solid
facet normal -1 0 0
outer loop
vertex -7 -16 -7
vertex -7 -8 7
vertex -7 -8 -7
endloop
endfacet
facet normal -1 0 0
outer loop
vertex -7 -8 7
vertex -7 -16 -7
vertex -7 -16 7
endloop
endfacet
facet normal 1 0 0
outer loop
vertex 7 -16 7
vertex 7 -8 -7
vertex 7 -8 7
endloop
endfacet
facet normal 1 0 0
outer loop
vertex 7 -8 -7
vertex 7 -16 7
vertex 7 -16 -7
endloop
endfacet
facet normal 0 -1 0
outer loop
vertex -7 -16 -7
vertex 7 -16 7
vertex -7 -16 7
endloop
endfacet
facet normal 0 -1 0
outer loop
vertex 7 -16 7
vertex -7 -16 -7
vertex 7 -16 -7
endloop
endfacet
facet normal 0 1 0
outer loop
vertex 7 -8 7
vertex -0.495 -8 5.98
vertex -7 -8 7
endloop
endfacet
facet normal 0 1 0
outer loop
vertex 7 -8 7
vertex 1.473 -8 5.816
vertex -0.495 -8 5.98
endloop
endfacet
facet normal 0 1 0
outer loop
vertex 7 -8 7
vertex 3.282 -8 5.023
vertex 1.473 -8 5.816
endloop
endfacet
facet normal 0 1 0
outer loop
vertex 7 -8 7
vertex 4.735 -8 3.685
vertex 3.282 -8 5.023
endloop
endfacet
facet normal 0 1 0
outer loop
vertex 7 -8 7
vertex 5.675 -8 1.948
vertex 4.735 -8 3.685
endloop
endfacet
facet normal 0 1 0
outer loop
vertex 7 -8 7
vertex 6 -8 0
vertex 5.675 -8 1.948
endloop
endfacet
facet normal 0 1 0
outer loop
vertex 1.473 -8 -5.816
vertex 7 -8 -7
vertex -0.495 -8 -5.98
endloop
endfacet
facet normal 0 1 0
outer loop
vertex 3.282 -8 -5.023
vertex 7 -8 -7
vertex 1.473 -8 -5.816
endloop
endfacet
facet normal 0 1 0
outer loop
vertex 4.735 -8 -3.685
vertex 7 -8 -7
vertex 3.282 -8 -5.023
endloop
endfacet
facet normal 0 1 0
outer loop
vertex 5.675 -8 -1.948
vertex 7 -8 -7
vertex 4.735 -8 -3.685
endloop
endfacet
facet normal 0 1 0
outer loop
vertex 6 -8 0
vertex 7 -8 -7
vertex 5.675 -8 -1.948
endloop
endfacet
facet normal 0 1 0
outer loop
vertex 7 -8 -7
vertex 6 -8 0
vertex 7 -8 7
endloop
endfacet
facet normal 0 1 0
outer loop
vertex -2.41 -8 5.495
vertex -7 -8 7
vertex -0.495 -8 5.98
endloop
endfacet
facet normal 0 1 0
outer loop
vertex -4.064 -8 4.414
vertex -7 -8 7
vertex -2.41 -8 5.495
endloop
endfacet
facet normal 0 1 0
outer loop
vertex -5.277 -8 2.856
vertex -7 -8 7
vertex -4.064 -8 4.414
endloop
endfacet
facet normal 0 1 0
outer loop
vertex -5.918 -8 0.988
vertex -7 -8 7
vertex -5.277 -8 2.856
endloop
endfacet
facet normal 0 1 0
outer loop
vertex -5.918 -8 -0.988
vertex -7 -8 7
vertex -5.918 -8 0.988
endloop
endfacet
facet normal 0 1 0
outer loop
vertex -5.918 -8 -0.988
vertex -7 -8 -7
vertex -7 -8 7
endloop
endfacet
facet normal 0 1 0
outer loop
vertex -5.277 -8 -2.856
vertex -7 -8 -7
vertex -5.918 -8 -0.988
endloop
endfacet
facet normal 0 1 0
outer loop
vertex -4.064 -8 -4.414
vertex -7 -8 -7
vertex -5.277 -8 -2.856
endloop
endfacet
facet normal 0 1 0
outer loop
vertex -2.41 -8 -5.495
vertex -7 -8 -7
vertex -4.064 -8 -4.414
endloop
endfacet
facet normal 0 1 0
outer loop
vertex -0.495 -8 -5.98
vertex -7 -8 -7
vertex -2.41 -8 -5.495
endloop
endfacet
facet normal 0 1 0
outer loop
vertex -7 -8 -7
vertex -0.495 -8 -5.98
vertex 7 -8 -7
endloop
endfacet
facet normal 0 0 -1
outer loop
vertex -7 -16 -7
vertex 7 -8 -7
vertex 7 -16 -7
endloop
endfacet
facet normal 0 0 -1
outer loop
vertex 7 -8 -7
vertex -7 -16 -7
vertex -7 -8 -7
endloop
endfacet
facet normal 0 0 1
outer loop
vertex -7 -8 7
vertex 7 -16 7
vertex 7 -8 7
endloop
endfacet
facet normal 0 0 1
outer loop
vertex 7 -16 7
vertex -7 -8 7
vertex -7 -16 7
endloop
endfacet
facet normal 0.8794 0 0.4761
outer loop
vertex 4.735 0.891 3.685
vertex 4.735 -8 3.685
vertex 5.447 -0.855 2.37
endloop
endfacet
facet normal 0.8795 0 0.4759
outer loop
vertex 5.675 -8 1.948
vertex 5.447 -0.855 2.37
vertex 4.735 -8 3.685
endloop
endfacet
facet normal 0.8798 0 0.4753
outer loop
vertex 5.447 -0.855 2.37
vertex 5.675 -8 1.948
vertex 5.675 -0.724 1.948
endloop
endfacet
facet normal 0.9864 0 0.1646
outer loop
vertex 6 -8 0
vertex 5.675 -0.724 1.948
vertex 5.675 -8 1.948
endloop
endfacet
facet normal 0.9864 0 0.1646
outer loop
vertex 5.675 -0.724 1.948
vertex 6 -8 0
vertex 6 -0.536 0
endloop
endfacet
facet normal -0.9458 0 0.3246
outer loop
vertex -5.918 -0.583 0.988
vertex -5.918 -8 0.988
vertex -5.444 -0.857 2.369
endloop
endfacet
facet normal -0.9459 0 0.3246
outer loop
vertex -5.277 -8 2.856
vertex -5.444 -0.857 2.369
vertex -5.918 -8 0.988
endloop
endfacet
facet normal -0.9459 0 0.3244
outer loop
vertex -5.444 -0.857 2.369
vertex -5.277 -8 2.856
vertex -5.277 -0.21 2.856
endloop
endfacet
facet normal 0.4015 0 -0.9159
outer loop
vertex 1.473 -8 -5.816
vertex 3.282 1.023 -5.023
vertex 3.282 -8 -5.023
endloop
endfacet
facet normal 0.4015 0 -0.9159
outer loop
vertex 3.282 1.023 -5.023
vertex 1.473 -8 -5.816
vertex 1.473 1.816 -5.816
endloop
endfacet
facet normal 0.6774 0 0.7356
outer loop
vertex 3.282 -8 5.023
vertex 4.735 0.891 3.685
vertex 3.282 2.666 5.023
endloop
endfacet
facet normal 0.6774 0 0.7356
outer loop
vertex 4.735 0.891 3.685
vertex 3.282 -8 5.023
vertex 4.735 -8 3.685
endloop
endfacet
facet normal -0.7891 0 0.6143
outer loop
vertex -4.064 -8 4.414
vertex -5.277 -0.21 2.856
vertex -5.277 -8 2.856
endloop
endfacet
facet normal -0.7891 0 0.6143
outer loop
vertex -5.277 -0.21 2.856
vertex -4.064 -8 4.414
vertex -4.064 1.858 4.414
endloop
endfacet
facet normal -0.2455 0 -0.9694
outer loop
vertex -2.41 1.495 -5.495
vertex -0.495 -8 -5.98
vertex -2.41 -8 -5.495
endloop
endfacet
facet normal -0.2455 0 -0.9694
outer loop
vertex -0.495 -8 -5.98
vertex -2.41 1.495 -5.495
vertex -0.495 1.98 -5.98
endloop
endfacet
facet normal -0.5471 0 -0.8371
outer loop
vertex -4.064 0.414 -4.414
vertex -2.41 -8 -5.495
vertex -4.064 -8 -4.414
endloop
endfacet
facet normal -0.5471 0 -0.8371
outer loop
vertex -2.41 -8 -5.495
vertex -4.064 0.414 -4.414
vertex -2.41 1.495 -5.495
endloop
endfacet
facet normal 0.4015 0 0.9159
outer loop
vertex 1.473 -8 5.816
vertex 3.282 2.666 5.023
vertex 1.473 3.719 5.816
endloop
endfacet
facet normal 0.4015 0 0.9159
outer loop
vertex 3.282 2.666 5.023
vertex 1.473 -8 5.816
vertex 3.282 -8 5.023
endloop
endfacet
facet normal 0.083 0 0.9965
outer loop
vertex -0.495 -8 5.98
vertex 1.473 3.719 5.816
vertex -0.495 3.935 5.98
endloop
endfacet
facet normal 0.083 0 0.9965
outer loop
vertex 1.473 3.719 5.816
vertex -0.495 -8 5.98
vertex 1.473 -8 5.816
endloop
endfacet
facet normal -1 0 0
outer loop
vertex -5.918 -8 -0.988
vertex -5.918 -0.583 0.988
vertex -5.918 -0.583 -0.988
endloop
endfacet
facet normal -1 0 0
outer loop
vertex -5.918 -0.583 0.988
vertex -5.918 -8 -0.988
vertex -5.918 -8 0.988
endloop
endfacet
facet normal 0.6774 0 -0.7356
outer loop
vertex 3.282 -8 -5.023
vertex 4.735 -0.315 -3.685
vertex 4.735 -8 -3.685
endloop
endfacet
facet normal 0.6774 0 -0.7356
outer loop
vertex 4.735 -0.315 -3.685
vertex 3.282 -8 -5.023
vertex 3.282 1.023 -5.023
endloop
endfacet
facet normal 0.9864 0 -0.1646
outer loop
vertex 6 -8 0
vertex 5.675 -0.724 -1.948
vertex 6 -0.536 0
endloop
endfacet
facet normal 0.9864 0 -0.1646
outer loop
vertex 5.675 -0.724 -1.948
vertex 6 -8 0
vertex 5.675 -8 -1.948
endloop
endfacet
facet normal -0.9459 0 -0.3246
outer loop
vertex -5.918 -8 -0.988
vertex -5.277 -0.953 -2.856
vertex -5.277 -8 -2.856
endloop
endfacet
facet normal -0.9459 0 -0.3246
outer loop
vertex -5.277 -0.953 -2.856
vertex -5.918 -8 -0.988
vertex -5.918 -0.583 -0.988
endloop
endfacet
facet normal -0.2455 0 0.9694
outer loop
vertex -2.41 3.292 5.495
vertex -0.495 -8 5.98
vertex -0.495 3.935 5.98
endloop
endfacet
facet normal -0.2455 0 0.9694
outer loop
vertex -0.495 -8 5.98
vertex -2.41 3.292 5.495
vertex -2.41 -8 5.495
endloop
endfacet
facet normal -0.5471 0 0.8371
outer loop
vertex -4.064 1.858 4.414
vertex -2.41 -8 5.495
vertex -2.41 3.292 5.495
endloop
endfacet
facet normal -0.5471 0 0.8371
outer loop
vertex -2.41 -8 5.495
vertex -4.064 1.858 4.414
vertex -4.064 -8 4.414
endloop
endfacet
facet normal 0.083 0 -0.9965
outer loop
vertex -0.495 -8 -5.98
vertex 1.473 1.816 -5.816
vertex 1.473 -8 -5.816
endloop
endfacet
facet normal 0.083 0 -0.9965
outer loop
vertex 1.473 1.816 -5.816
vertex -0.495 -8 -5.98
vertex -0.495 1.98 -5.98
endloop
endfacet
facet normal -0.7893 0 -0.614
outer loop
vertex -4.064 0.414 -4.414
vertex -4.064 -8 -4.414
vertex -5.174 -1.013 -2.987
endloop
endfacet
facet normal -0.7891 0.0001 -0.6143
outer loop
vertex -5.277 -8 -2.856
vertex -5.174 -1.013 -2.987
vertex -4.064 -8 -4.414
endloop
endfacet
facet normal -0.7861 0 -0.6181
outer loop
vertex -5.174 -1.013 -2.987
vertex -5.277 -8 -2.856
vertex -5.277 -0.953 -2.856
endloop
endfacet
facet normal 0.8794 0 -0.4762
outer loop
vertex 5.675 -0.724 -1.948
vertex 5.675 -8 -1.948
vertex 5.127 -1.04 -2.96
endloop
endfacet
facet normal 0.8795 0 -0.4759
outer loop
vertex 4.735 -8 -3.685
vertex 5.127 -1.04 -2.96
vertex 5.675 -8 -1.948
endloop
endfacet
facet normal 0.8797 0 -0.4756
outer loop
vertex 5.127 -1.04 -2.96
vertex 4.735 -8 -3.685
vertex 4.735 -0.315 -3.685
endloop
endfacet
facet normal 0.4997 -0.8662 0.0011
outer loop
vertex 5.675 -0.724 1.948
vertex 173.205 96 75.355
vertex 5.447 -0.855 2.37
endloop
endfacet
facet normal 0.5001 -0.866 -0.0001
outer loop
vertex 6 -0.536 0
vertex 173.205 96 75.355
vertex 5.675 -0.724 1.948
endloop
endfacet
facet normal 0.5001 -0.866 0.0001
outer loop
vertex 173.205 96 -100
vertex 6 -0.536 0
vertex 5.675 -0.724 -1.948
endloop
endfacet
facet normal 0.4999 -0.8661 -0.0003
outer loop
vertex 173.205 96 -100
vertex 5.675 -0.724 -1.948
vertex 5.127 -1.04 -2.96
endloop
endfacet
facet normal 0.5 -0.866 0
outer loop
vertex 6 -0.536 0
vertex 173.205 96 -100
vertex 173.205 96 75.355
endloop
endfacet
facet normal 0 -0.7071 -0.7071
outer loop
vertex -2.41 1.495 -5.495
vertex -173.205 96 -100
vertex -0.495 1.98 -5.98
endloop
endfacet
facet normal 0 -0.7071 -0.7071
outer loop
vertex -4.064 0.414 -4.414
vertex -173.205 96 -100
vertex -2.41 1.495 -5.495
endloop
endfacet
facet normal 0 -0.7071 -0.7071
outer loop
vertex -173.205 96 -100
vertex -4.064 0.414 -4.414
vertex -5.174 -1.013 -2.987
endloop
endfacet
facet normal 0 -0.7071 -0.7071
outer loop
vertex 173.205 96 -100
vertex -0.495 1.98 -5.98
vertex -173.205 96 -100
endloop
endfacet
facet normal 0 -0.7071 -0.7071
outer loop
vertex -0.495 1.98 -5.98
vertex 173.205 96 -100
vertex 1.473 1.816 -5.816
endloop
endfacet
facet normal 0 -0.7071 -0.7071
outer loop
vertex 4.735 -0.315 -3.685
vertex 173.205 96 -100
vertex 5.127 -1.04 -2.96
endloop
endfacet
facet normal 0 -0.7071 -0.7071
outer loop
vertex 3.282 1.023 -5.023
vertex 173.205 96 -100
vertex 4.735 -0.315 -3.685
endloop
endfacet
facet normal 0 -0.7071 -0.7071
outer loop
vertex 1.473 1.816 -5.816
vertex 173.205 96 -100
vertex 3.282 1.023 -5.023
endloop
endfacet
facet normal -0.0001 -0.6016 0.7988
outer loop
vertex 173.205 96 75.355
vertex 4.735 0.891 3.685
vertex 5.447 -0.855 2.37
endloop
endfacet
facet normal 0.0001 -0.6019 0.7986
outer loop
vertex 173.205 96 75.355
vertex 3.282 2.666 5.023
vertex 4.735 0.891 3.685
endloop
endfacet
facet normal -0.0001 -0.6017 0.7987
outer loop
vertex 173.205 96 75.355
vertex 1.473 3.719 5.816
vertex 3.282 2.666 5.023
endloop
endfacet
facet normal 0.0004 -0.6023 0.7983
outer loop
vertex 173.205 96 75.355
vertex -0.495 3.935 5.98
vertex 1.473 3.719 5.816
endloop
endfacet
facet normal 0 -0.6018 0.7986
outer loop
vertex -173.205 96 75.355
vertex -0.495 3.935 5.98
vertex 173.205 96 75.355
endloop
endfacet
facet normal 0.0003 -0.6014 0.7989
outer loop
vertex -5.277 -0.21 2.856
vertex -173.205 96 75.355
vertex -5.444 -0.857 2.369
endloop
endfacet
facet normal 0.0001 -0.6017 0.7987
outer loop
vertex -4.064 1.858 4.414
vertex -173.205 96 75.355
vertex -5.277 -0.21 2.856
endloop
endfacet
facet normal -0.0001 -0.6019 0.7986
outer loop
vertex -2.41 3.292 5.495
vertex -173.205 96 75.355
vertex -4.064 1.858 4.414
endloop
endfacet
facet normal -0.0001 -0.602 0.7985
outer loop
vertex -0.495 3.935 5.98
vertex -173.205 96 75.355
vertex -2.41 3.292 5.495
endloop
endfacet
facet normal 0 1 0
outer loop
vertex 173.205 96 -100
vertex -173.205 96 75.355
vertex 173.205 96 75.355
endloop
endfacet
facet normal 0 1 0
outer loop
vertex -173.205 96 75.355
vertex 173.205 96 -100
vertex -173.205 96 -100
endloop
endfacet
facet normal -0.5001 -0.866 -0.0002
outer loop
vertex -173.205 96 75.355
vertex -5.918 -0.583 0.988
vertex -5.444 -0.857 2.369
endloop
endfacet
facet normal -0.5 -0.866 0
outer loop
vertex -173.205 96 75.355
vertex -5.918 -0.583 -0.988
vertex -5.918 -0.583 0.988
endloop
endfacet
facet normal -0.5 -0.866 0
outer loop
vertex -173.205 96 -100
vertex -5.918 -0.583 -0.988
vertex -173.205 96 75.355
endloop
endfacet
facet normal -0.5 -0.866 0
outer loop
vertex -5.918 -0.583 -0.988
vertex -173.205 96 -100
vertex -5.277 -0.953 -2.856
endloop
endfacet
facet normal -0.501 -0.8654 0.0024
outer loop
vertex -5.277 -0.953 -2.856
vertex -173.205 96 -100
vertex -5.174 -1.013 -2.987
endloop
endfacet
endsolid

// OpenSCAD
camera();

module camera() {
    objLength = 8;
    objD = 12;
    camW=14;
    camL=14;
    camH=8;
    
    union() {
        translate([0, -objLength - camH/2, 0]) rotate([90,0,0]) cube([camL, camW, camH], center=true);
        rotate([90,0,0]) translate([0, 0, -objLength]) cylinder(h=2*objLength, d=objD);
        translate([0,-4,0]) rotate([90,0,0]) viewField();
    }
}

module viewField() {
    hAng1 = 60;
    hAng2 = 60;
    vAng1 = 82 - 45;
    vAng2 = 45;
    coneHeight = 100;

    w1 = tan(hAng1) * coneHeight;
    w2 = -tan(hAng2) * coneHeight;
    h1 = tan(vAng1) * coneHeight;
    h2 = -tan(vAng2) * coneHeight;
    
    translate([0,0,-coneHeight]) polyhedron(
      points=[[w1,h1,0],[w1,h2,0],[w2,h2,0],[w2,h1,0],[0,0,coneHeight]],
      faces=[[0,1,4],[1,2,4],[2,3,4],[3,0,4],[1,0,3],[2,1,3]]
    );
}
